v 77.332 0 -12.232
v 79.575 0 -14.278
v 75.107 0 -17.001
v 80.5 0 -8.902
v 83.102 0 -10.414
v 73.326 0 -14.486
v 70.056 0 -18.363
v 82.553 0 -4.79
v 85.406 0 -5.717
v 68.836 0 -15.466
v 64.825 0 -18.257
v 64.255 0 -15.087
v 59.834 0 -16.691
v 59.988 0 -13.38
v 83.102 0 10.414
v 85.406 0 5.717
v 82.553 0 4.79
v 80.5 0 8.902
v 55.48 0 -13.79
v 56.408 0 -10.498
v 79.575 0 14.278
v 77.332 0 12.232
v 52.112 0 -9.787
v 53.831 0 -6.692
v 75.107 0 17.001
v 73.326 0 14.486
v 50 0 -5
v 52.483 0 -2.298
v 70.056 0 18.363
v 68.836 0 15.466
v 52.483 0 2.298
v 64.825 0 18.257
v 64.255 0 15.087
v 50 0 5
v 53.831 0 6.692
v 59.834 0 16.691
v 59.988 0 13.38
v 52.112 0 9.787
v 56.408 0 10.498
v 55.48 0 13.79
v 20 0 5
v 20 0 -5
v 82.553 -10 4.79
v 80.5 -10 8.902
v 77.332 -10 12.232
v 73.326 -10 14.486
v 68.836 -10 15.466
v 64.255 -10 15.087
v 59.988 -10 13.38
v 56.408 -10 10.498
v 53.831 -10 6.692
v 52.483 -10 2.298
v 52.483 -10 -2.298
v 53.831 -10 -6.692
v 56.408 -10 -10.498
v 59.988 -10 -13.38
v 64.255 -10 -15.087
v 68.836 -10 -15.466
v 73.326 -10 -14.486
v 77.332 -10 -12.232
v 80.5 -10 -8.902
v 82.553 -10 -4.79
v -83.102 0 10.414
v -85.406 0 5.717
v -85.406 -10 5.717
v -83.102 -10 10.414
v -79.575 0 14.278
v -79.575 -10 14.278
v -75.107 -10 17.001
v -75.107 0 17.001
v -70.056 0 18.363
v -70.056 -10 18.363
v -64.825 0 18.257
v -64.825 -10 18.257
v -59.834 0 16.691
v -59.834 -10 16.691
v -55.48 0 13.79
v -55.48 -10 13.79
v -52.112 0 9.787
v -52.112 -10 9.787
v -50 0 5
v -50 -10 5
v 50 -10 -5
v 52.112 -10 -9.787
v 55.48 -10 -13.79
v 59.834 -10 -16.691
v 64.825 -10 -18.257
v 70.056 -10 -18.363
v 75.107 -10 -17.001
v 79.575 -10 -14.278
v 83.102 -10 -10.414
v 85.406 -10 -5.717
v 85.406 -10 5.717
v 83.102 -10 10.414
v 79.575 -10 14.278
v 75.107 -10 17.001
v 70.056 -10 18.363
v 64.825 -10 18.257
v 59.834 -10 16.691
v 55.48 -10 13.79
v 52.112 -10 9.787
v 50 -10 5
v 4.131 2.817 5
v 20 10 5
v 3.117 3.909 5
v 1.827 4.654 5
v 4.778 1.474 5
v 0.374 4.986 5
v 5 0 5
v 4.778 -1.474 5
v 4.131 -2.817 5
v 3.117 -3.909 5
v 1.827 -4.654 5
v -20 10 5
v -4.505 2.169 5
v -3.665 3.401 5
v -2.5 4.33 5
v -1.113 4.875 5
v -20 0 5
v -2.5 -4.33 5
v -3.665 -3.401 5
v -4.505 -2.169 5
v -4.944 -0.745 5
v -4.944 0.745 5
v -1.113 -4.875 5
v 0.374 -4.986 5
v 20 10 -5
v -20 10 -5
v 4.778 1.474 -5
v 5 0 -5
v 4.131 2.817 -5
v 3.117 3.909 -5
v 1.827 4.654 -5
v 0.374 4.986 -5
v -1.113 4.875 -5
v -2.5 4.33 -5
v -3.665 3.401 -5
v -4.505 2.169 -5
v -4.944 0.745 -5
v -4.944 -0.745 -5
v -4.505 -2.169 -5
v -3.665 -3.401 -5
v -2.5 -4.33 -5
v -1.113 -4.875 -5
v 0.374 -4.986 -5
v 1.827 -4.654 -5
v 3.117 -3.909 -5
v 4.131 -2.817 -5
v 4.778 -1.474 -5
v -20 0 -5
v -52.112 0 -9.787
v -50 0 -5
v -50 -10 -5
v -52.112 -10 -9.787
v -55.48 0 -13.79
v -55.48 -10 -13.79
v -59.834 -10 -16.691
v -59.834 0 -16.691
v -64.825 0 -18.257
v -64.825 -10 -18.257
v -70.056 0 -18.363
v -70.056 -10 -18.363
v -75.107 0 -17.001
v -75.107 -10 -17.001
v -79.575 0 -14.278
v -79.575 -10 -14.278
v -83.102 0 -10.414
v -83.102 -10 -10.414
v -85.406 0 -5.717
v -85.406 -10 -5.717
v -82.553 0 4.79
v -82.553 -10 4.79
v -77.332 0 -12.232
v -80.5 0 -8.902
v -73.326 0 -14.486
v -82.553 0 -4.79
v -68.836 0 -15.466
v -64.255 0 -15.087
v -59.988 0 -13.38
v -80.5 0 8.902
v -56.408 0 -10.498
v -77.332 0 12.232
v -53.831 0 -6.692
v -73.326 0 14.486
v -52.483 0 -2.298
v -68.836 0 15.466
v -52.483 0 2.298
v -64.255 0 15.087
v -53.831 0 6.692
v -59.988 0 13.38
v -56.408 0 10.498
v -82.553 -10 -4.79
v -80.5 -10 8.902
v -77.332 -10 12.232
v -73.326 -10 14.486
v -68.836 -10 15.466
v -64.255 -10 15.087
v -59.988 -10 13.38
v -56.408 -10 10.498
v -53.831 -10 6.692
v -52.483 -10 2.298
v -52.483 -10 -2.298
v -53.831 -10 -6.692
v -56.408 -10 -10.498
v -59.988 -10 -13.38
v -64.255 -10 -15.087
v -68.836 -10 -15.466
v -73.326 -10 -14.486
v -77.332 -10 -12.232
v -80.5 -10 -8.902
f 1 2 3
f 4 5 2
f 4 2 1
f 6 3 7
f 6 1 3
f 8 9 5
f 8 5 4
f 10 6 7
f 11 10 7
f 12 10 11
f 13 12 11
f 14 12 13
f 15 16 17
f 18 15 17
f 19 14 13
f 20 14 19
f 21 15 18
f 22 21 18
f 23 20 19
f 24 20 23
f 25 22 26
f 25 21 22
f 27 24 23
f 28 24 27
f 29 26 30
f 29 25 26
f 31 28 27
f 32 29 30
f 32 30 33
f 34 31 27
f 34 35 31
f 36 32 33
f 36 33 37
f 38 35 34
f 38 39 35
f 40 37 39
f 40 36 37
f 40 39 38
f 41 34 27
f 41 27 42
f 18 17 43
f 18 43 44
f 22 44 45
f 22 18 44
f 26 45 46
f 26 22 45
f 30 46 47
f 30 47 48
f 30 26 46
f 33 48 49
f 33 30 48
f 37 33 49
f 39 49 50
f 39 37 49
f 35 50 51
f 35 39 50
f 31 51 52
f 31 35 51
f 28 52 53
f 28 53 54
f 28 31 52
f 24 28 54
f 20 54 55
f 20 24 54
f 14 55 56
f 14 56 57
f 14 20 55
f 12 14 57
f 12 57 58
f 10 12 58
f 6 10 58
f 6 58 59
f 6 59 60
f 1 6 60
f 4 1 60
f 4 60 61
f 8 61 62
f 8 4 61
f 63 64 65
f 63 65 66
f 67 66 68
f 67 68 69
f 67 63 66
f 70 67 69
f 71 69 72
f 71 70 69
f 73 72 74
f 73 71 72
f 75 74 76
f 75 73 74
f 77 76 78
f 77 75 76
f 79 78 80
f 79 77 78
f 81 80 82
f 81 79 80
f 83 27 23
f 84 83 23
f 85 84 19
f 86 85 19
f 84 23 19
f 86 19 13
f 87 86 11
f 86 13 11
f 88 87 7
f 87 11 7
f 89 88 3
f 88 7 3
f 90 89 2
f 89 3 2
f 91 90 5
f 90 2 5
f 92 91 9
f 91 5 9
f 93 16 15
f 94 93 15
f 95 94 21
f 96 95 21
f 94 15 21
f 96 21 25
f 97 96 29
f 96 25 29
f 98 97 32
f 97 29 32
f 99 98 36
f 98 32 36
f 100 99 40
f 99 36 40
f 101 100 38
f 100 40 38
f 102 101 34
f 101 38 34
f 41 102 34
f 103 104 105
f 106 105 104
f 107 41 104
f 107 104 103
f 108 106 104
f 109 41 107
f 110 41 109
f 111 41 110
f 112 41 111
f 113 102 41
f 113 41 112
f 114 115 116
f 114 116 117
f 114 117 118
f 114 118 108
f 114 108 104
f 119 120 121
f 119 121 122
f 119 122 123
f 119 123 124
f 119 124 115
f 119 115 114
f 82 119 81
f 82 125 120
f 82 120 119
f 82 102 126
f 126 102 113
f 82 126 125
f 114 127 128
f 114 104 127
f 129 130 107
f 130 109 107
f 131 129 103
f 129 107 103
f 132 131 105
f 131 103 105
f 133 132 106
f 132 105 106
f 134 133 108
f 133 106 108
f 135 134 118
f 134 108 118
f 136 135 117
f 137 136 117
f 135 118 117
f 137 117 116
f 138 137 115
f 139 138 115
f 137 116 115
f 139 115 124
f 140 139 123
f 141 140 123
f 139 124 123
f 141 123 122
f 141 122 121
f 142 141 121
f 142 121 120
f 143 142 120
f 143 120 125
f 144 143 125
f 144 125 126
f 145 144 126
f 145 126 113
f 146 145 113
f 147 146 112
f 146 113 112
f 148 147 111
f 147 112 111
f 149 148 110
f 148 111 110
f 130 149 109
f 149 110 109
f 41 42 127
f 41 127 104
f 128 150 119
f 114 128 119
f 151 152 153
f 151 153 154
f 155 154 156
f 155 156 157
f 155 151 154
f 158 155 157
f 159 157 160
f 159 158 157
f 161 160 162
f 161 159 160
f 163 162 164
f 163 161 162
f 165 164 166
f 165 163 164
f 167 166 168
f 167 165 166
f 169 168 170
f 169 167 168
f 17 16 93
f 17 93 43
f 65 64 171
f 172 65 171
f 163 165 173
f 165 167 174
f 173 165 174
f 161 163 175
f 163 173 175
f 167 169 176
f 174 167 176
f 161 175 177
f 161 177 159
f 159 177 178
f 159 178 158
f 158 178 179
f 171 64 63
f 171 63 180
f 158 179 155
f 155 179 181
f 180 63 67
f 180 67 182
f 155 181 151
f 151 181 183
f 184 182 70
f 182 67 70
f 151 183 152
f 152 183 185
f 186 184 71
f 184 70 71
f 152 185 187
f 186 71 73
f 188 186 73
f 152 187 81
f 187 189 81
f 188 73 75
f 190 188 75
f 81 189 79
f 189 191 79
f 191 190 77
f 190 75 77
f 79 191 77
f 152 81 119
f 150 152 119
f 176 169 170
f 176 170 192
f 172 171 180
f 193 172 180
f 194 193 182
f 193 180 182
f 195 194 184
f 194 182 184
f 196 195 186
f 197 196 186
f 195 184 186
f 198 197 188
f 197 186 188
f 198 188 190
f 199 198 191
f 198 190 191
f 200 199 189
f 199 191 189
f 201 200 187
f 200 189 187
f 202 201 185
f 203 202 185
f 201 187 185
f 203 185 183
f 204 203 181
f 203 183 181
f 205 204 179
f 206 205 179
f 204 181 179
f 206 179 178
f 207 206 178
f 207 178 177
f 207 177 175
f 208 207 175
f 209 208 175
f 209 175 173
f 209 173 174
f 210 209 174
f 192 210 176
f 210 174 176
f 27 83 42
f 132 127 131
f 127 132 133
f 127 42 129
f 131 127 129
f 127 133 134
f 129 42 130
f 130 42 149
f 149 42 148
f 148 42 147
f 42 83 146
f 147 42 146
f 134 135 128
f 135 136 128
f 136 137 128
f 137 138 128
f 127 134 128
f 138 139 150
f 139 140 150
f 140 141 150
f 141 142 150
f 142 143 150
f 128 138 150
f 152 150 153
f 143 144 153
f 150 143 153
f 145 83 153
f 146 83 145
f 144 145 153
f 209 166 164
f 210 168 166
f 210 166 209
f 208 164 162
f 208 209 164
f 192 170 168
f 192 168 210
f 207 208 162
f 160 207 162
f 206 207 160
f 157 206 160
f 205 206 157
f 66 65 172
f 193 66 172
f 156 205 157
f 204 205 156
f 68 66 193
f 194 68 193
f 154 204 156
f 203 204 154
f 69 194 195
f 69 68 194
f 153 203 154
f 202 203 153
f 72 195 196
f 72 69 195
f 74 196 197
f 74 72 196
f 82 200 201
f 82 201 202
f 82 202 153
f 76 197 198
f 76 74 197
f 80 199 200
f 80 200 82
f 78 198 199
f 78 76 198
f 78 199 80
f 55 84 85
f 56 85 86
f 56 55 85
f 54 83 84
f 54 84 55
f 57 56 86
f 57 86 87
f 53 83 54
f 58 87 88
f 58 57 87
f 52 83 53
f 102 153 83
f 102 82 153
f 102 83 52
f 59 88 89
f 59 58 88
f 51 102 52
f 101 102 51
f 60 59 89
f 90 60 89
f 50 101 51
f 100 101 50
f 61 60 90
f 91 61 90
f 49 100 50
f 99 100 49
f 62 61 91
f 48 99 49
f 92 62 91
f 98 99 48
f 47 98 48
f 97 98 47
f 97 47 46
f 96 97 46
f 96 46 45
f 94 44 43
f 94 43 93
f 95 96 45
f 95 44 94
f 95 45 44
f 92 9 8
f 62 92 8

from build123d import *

# Parameters (mm, degrees)
PAD_DEPTH         = 10
SKETCH001_W       = 20
SKETCH001_H       = 10
PAD001_DEPTH      = 10
SKETCH002_R       = 5
POCKET_DEPTH      = 18.501
POCKET_DEPTH_BACK = -18.501


with BuildPart() as part:
    # Sketch → Pad (new body)
    with BuildSketch(Plane.XZ):
        with BuildLine():
            Line((0, 5), (50, 5))
            ThreePointArc((85.406059, 5.716814), (67.437048, 18.49621), (50, 5))
            Line((85.406059, 5.716814), (82.552889, 4.789763))
            ThreePointArc((82.552889, 4.789763), (52.311513, 0), (82.552889, -4.789763))
            Line((85.406059, -5.716814), (82.552889, -4.789763))
            ThreePointArc((50, -5), (67.437048, -18.49621), (85.406059, -5.716814))
            Line((0, -5), (50, -5))
            Line((0, 5), (0, -5))
        make_face()
    pad = extrude(amount=PAD_DEPTH)

    # Sketch001 → Pad001 (join)
    with BuildSketch(Plane.XZ):
        with Locations((10, 0)):
            Rectangle(SKETCH001_W, SKETCH001_H)
    pad001 = extrude(amount=-PAD001_DEPTH)

    # Mirrored: Pad, Pad001 across Sketch V_Axis
    add(pad.mirror(Plane(origin=(0, 0, 0), x_dir=(0, -1, 0), z_dir=(1, 0, 0))))
    add(pad001.mirror(Plane(origin=(0, 0, 0), x_dir=(0, -1, 0), z_dir=(1, 0, 0))))

    # Sketch002 → Pocket (cut, two sides)
    with BuildSketch(Plane.XY) as pocket_sk:
        Circle(SKETCH002_R)
    extrude(amount=-POCKET_DEPTH, mode=Mode.SUBTRACT)
    extrude(pocket_sk.sketch, amount=-POCKET_DEPTH_BACK, mode=Mode.SUBTRACT)


solid = part.part
